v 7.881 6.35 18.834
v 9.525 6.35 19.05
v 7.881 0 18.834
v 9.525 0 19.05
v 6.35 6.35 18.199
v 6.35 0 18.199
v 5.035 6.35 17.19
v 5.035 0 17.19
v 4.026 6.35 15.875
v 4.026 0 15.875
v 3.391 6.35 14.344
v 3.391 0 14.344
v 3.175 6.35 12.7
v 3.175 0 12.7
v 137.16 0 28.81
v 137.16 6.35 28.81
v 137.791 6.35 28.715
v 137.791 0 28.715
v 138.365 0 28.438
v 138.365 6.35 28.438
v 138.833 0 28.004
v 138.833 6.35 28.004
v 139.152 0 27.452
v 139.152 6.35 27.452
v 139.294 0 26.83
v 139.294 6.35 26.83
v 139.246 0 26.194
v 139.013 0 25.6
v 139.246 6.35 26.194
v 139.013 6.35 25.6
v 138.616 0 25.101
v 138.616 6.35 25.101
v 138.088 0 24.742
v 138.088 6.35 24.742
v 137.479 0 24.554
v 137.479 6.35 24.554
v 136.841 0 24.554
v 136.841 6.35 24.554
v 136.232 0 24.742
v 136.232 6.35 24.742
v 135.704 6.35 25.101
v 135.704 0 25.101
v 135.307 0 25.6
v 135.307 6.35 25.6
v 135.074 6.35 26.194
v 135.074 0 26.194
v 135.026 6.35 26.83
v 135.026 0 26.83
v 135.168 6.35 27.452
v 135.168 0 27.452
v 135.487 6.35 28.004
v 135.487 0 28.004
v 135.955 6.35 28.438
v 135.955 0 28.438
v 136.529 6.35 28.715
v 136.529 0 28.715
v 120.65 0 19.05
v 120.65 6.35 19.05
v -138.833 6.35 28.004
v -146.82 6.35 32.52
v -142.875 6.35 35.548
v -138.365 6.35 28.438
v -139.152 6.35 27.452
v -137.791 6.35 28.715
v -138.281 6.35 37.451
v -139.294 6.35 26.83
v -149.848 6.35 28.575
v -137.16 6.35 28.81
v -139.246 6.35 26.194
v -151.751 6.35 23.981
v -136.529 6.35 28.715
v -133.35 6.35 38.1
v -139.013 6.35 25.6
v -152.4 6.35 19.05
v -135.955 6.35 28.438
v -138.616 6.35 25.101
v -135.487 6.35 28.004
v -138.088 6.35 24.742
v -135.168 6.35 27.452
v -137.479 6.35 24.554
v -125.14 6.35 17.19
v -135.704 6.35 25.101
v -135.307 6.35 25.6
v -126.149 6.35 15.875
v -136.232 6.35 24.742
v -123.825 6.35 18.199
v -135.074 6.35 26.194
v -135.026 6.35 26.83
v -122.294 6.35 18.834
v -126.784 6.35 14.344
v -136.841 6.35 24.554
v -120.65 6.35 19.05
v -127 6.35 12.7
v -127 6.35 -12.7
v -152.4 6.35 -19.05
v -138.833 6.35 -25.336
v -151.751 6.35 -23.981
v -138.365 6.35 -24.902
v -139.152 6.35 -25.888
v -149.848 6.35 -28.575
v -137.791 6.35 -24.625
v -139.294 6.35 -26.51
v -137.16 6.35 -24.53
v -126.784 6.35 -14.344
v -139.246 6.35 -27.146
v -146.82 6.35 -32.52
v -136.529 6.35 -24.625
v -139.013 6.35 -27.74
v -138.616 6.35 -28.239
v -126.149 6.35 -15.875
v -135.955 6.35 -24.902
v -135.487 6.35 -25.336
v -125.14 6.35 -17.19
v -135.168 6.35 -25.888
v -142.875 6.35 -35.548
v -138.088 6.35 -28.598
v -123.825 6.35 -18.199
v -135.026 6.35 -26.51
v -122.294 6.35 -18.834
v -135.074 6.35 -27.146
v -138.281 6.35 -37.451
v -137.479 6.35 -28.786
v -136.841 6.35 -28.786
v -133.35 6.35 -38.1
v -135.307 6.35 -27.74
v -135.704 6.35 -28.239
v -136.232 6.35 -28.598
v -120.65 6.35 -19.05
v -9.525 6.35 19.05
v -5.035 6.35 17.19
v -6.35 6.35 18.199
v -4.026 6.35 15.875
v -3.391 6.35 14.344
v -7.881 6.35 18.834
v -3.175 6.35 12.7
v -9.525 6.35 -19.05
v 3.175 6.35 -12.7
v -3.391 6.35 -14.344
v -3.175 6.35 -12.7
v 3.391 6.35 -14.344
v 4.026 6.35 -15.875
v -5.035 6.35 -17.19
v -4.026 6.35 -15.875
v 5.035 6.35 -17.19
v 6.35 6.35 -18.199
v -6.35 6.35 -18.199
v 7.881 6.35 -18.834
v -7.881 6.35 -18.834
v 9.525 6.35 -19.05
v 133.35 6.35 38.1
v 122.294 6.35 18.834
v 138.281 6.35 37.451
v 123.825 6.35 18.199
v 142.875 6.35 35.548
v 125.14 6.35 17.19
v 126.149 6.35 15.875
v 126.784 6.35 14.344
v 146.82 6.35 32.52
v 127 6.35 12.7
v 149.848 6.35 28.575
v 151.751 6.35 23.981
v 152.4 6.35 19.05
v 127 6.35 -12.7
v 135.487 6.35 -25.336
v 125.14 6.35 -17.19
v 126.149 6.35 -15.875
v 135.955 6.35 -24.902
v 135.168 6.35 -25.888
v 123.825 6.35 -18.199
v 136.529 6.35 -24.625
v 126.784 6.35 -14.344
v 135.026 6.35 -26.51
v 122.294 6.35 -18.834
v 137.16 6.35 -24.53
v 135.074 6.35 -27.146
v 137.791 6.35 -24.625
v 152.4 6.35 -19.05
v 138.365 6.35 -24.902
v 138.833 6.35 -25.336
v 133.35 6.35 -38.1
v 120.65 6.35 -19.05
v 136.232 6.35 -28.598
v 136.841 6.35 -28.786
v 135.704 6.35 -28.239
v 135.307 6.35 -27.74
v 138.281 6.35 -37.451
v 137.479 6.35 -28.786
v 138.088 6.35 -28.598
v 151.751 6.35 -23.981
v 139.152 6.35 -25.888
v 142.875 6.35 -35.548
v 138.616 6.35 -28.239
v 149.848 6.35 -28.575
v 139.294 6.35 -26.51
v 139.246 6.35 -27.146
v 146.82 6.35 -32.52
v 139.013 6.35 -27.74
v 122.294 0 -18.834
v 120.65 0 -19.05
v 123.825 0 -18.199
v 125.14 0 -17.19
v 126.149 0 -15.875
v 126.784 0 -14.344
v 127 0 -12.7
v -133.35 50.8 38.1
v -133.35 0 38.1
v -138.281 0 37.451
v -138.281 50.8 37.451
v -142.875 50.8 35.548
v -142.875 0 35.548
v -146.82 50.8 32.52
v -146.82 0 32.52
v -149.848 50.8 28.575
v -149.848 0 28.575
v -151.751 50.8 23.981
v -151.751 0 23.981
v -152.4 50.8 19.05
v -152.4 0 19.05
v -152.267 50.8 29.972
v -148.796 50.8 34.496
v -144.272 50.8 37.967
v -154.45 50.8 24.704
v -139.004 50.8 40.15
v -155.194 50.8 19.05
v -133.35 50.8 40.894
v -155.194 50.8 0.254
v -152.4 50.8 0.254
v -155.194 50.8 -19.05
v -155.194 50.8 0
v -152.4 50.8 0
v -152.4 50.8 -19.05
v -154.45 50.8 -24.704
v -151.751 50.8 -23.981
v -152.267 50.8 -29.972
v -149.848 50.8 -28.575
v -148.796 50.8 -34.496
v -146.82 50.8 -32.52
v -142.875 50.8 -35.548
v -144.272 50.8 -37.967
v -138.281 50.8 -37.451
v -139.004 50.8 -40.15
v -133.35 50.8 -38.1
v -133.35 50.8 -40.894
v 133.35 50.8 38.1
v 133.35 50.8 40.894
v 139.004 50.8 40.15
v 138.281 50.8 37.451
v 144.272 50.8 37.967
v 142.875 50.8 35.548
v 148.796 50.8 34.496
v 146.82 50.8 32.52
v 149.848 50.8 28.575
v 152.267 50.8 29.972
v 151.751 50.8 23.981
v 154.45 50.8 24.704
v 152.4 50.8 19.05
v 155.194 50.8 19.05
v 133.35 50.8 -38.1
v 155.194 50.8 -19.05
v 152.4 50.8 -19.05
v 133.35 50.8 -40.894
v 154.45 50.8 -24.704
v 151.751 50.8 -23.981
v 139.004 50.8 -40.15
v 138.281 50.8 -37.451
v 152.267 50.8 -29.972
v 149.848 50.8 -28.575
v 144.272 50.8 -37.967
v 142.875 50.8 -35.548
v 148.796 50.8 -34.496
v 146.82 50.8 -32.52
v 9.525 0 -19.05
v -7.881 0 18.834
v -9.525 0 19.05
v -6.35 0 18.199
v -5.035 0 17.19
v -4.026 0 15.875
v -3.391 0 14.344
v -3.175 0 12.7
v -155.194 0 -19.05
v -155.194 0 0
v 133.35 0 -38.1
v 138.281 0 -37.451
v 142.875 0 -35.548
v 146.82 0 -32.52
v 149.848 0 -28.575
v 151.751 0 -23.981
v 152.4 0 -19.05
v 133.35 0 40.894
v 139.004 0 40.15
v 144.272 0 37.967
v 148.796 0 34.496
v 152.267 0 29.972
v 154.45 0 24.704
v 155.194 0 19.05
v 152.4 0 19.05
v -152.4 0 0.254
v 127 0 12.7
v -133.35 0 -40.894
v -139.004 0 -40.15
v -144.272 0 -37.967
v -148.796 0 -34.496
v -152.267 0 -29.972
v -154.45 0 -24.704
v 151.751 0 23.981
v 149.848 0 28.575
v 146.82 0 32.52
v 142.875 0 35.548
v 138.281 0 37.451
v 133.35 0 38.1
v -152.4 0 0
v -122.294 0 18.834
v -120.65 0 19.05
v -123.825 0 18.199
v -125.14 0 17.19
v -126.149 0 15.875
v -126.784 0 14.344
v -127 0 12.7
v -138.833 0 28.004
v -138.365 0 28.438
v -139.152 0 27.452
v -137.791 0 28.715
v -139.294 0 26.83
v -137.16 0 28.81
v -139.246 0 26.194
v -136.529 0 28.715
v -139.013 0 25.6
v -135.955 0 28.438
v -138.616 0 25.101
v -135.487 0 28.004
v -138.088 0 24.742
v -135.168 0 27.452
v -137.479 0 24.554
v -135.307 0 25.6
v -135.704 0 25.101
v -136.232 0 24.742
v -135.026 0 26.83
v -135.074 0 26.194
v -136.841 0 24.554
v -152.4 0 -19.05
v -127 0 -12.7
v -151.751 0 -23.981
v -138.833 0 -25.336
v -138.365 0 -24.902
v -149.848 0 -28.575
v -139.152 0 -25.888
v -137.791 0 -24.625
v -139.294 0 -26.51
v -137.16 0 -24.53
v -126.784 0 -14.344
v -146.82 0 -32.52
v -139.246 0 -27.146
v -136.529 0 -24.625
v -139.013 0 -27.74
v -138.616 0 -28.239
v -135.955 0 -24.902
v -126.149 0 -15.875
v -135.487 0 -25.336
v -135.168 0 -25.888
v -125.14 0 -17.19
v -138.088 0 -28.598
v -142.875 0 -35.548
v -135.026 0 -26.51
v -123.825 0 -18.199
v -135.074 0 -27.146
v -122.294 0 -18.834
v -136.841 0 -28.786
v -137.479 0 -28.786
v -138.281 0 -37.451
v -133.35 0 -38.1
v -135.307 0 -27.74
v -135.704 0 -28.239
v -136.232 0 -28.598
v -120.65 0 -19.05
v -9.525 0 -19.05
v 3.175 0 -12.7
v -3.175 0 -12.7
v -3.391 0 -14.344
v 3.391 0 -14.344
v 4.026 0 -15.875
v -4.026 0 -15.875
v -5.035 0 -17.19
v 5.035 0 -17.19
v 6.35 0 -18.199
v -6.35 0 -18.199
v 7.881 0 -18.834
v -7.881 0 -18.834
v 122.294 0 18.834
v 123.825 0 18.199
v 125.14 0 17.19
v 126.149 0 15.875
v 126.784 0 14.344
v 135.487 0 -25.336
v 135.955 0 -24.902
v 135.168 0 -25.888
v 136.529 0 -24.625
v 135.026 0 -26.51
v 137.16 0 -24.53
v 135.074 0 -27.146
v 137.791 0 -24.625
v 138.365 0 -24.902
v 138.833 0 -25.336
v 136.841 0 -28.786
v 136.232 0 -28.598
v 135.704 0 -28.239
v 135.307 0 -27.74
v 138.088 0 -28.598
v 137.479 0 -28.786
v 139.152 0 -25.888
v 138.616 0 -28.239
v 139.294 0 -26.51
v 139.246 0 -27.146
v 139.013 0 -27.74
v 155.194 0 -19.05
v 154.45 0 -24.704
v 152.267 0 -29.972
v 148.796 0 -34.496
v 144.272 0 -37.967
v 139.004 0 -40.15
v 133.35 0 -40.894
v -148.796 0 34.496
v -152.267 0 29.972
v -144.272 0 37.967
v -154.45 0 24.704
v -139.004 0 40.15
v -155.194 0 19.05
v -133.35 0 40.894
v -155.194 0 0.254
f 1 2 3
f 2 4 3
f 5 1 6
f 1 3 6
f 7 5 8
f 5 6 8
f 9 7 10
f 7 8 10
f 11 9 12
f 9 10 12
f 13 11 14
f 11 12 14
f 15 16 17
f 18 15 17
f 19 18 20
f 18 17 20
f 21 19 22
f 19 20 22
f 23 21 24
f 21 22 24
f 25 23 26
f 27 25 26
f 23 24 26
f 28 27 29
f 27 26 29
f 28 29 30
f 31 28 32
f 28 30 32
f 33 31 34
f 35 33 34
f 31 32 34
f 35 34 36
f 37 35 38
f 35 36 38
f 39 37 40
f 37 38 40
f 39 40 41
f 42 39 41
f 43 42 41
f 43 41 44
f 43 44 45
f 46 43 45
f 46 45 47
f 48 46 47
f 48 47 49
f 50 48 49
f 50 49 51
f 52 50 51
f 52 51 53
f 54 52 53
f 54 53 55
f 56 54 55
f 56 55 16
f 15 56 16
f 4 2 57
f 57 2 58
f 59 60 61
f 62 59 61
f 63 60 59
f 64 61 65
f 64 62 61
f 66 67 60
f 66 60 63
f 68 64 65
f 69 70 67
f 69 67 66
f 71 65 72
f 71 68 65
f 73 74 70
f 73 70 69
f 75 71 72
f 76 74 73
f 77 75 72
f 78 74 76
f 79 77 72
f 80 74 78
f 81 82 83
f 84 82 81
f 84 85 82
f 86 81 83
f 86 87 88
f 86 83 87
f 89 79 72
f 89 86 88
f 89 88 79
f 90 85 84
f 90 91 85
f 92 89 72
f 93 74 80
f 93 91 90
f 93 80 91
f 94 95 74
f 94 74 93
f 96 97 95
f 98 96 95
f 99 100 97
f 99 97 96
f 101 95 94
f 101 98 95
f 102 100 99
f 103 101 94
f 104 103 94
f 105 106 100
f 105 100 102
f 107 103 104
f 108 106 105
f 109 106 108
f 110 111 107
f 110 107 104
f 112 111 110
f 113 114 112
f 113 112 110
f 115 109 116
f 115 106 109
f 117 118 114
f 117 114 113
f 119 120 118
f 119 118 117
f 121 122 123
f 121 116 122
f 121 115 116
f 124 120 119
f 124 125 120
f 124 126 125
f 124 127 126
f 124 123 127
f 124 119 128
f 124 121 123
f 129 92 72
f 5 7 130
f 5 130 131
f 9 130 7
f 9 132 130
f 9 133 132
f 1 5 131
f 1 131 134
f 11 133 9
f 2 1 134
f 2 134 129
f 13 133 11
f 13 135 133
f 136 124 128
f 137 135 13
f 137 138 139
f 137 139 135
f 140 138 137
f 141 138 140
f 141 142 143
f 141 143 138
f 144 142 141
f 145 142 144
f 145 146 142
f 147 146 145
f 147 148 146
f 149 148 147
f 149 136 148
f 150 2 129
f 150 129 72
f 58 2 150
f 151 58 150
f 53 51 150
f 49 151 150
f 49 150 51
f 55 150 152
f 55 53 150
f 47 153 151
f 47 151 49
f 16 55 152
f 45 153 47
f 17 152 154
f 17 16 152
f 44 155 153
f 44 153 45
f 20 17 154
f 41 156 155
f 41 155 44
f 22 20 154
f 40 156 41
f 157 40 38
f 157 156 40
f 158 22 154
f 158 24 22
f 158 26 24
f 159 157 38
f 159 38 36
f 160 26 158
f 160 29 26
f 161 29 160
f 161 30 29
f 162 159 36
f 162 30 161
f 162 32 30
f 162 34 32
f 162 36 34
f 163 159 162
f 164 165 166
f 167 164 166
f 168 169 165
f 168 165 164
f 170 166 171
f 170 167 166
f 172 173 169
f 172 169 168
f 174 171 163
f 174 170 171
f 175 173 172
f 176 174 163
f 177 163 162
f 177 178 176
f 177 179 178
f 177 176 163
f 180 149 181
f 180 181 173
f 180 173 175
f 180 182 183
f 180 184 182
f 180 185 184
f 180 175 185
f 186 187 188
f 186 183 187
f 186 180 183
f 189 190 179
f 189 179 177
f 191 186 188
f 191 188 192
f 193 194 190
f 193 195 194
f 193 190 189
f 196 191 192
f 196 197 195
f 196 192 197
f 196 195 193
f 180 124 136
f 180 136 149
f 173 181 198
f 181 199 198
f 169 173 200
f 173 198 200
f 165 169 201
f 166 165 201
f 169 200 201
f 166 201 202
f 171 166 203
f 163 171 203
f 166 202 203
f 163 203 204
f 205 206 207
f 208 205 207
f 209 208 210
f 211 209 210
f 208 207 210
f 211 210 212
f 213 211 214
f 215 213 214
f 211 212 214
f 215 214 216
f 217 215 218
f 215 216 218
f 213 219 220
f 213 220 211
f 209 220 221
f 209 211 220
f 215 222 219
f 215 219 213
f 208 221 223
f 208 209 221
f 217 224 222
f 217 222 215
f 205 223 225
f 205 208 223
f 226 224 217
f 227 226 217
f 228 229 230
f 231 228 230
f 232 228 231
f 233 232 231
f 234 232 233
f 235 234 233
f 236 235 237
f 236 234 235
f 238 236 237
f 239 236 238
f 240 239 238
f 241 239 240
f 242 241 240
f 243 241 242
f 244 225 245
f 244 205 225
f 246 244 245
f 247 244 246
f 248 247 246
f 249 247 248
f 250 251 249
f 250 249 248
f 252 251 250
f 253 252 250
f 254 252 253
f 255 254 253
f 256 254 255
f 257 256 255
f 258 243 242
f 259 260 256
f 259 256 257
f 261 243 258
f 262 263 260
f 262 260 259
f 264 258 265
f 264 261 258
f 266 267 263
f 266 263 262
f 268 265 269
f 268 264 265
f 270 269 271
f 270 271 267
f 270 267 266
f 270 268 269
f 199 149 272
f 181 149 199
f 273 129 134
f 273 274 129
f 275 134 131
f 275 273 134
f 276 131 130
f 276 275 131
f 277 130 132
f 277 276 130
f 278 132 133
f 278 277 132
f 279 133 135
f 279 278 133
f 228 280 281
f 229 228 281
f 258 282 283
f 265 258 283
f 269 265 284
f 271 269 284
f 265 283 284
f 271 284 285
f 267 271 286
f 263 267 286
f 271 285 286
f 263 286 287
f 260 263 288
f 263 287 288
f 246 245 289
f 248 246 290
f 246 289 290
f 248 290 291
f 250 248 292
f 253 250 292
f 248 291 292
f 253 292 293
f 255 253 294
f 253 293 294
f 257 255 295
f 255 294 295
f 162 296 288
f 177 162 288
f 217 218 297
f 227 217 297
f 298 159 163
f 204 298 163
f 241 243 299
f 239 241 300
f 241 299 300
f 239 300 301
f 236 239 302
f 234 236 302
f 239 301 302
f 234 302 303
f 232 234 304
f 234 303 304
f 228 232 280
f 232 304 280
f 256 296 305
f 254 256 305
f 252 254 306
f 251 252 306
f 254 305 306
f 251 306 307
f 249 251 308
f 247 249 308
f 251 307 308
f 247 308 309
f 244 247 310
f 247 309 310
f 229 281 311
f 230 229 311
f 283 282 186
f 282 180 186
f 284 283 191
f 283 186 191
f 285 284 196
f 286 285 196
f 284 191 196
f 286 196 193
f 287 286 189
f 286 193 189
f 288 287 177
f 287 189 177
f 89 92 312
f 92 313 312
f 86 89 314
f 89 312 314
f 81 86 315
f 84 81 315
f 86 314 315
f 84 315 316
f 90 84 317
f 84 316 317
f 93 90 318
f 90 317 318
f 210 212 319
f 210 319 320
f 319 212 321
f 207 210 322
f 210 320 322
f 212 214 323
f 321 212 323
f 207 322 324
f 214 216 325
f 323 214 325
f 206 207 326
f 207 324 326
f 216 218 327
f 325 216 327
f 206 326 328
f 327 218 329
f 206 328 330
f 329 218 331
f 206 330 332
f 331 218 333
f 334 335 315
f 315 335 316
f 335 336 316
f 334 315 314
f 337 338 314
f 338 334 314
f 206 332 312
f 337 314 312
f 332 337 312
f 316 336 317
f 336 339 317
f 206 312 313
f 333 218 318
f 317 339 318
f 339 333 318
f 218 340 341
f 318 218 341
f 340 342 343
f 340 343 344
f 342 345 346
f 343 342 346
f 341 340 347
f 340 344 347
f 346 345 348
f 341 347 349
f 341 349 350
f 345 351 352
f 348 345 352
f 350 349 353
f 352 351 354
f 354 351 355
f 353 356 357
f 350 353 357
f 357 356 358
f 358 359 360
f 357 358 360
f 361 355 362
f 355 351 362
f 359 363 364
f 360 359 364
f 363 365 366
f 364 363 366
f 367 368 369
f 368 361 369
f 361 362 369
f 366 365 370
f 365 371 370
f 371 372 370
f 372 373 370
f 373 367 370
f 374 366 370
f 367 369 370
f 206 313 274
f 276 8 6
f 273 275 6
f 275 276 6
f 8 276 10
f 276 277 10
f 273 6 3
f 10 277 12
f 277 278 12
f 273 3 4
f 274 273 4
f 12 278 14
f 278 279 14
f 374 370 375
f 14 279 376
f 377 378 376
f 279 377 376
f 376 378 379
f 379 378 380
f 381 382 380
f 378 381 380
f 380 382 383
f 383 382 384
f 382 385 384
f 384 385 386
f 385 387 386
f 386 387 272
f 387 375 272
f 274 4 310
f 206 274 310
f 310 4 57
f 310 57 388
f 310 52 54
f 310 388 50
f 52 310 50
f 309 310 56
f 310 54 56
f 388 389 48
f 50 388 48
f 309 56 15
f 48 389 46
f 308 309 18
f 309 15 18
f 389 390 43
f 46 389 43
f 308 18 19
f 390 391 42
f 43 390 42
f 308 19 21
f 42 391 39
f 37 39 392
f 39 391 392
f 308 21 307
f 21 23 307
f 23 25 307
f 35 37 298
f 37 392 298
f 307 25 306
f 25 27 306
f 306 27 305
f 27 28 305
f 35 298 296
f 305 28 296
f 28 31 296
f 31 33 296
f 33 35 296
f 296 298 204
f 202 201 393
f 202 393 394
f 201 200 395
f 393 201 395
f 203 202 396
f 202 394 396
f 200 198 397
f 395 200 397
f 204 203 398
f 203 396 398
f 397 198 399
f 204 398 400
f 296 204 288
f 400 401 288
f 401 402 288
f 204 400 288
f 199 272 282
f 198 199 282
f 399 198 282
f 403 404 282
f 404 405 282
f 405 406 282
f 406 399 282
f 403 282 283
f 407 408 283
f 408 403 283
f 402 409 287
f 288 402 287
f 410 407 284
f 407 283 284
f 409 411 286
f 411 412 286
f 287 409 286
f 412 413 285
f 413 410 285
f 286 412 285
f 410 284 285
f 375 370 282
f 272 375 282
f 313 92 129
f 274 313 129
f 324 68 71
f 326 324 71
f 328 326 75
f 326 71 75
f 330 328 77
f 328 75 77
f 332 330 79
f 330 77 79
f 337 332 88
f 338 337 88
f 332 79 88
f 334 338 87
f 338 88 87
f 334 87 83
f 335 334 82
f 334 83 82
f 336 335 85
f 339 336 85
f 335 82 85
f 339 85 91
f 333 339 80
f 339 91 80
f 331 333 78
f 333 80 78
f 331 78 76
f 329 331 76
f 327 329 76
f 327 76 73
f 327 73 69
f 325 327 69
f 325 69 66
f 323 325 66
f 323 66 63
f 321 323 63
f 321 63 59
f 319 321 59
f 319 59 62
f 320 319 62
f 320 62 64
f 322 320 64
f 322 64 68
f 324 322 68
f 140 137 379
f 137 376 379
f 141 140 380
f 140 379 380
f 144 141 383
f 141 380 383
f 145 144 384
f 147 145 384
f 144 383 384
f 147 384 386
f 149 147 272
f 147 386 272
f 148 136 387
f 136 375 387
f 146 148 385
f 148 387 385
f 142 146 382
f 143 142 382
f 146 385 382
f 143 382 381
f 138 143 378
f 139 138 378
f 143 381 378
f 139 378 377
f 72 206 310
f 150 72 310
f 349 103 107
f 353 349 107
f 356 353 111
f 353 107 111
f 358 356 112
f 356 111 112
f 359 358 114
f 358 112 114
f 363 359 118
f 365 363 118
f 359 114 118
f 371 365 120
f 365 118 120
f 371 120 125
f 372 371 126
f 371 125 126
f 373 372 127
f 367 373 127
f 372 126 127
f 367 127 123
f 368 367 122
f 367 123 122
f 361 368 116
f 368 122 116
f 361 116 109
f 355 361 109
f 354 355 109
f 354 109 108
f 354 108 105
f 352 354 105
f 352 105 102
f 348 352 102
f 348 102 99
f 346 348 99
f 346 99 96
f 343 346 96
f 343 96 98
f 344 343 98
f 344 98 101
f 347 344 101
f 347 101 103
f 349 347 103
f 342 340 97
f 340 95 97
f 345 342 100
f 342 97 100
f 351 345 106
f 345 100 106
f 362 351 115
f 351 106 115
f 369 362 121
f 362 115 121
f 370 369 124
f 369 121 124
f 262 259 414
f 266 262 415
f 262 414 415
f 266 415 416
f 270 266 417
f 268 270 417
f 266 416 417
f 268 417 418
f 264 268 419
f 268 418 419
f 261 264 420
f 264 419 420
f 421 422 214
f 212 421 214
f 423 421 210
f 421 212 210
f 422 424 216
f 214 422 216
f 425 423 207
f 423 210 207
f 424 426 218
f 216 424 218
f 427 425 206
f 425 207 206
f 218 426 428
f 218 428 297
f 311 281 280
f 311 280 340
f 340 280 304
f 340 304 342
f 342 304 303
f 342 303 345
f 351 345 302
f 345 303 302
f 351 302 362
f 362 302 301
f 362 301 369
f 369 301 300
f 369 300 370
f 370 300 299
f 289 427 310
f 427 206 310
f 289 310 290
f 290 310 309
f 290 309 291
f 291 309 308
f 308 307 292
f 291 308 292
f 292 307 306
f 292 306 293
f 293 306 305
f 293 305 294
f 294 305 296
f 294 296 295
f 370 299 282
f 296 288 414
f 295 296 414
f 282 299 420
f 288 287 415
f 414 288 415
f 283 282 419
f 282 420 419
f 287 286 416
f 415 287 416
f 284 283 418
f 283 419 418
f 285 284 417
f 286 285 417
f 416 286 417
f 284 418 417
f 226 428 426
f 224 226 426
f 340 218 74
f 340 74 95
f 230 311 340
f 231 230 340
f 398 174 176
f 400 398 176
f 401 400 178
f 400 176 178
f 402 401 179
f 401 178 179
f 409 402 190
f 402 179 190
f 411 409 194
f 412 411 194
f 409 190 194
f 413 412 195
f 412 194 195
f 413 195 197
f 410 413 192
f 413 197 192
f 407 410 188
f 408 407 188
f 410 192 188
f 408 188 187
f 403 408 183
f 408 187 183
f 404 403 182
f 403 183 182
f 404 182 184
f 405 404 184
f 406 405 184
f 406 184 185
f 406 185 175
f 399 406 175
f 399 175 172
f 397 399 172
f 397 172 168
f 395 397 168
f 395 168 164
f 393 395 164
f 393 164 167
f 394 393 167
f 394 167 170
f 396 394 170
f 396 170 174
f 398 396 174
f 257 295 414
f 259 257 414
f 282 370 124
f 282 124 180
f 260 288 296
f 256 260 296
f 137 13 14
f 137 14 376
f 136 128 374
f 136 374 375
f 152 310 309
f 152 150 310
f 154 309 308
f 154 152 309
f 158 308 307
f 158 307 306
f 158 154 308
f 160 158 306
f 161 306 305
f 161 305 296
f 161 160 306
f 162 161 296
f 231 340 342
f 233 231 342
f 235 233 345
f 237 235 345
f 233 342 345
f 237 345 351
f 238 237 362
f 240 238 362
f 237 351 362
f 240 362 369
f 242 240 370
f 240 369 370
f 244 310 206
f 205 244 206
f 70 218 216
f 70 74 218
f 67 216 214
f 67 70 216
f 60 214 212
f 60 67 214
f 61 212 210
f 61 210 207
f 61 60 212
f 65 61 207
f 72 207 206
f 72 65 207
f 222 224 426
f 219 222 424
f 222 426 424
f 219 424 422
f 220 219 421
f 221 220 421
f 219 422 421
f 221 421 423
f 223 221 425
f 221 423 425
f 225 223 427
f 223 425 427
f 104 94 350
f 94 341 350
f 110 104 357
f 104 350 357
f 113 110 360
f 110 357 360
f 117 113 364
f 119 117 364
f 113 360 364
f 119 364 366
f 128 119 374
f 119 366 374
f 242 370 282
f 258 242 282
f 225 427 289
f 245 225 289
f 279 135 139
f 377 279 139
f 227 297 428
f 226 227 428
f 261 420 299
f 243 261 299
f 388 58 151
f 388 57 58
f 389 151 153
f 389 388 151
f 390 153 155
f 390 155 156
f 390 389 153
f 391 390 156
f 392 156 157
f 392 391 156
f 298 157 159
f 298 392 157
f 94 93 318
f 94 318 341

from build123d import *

# Parameters (mm, degrees)
SKETCH1_W           = 304.8
SKETCH1_H           = 76.2
BOSS_EXTRUDE1_DEPTH = 6.35
SKETCH2_W           = 254
SKETCH2_H           = 38.1
CUT_EXTRUDE1_DEPTH  = 158.21861372
SKETCH3_W           = 6.35
SKETCH3_H           = 38.1
BOSS_EXTRUDE2_DEPTH = 6.35
FILLET1_R           = 19.05
FILLET2_R           = 6.35
SKETCH4_R           = 2.13995
CUT_EXTRUDE2_DEPTH  = 158.21861372
BOSS_EXTRUDE3_DEPTH = 50.8


with BuildPart() as part:
    # Sketch1 → Boss-Extrude1 (new body)
    with BuildSketch(Plane(origin=(0, 0, 0), x_dir=(1, 0, 0), z_dir=(0, 1, 0))):
        Rectangle(SKETCH1_W, SKETCH1_H)
    extrude(amount=BOSS_EXTRUDE1_DEPTH)

    # Sketch2 → Cut-Extrude1 (cut, through all)
    with BuildSketch(Plane(origin=(0, 6.35, 0), x_dir=(1, 0, 0), z_dir=(0, 1, 0))):
        Rectangle(SKETCH2_W, SKETCH2_H)
    extrude(amount=-CUT_EXTRUDE1_DEPTH, mode=Mode.SUBTRACT)

    # Sketch3 → Boss-Extrude2 (add)
    with BuildSketch(Plane(origin=(0, 6.35, 0), x_dir=(1, 0, 0), z_dir=(0, 1, 0))):
        Rectangle(SKETCH3_W, SKETCH3_H)
    extrude(amount=-BOSS_EXTRUDE2_DEPTH)

    # Fillet1
    fillet1_edges = [part.edges().sort_by_distance(p)[0] for p in [
        (152.4, 3.175, 38.1),
        (-152.4, 3.175, 38.1),
        (-152.4, 3.175, -38.1),
        (152.4, 3.175, -38.1),
    ]]
    fillet(fillet1_edges, radius=FILLET1_R)

    # Fillet2
    fillet2_edges = [part.edges().sort_by_distance(p)[0] for p in [
        (127, 3.175, -19.05),
        (127, 3.175, 19.05),
        (-127, 3.175, 19.05),
        (-127, 3.175, -19.05),
        (3.175, 3.175, -19.05),
        (3.175, 3.175, 19.05),
        (-3.175, 3.175, 19.05),
        (-3.175, 3.175, -19.05),
    ]]
    fillet(fillet2_edges, radius=FILLET2_R)

    # Sketch4 → Cut-Extrude2 (cut, through all)
    with BuildSketch(Plane(origin=(0, 6.35, 0), x_dir=(1, 0, 0), z_dir=(0, 1, 0))):
        with Locations(Location((137.16, 26.67, 0), (0, 0, 270))):
            Circle(SKETCH4_R)
        with Locations(Location((137.16, -26.67, 0), (0, 0, 270))):
            Circle(SKETCH4_R)
        with Locations(Location((-137.16, -26.67, 0), (0, 0, 270))):
            Circle(SKETCH4_R)
        with Locations(Location((-137.16, 26.67, 0), (0, 0, 270))):
            Circle(SKETCH4_R)
    extrude(amount=-CUT_EXTRUDE2_DEPTH, mode=Mode.SUBTRACT)


with BuildPart() as body_2:
    # Sketch5 → Boss-Extrude3 (new body)
    with BuildSketch(Plane(origin=(0, 0, 0), x_dir=(1, 0, 0), z_dir=(0, 1, 0))):
        with BuildLine():
            Line((-155.194, 19.05), (-155.194, 0))
            Line((-155.194, 0), (-152.4, 0))
            Line((-152.4, 0), (-152.4, 19.05))
            ThreePointArc((-152.4, 19.05), (-146.820384182, 32.520384182), (-133.35, 38.1))
            Line((-133.35, 38.1), (133.35, 38.1))
            ThreePointArc((133.35, 38.1), (146.820384182, 32.520384182), (152.4, 19.05))
            Line((152.4, 19.05), (152.4, -19.05))
            ThreePointArc((152.4, -19.05), (146.820384182, -32.520384182), (133.35, -38.1))
            Line((133.35, -38.1), (-133.35, -38.1))
            ThreePointArc((-133.35, -38.1), (-146.820384182, -32.520384182), (-152.4, -19.05))
            Line((-152.4, -19.05), (-152.4, -0.254))
            Line((-152.4, -0.254), (-155.194, -0.254))
            Line((-155.194, -0.254), (-155.194, -19.05))
            ThreePointArc((-155.194, -19.05), (-148.796040528, -34.496040528), (-133.35, -40.894))
            Line((-133.35, -40.894), (133.35, -40.894))
            ThreePointArc((133.35, -40.894), (148.796040528, -34.496040528), (155.194, -19.05))
            Line((155.194, -19.05), (155.194, 19.05))
            ThreePointArc((155.194, 19.05), (148.796040528, 34.496040528), (133.35, 40.894))
            Line((133.35, 40.894), (-133.35, 40.894))
            ThreePointArc((-133.35, 40.894), (-148.796040528, 34.496040528), (-155.194, 19.05))
        make_face()
    extrude(amount=BOSS_EXTRUDE3_DEPTH)


solid = Compound([part.part, body_2.part])
